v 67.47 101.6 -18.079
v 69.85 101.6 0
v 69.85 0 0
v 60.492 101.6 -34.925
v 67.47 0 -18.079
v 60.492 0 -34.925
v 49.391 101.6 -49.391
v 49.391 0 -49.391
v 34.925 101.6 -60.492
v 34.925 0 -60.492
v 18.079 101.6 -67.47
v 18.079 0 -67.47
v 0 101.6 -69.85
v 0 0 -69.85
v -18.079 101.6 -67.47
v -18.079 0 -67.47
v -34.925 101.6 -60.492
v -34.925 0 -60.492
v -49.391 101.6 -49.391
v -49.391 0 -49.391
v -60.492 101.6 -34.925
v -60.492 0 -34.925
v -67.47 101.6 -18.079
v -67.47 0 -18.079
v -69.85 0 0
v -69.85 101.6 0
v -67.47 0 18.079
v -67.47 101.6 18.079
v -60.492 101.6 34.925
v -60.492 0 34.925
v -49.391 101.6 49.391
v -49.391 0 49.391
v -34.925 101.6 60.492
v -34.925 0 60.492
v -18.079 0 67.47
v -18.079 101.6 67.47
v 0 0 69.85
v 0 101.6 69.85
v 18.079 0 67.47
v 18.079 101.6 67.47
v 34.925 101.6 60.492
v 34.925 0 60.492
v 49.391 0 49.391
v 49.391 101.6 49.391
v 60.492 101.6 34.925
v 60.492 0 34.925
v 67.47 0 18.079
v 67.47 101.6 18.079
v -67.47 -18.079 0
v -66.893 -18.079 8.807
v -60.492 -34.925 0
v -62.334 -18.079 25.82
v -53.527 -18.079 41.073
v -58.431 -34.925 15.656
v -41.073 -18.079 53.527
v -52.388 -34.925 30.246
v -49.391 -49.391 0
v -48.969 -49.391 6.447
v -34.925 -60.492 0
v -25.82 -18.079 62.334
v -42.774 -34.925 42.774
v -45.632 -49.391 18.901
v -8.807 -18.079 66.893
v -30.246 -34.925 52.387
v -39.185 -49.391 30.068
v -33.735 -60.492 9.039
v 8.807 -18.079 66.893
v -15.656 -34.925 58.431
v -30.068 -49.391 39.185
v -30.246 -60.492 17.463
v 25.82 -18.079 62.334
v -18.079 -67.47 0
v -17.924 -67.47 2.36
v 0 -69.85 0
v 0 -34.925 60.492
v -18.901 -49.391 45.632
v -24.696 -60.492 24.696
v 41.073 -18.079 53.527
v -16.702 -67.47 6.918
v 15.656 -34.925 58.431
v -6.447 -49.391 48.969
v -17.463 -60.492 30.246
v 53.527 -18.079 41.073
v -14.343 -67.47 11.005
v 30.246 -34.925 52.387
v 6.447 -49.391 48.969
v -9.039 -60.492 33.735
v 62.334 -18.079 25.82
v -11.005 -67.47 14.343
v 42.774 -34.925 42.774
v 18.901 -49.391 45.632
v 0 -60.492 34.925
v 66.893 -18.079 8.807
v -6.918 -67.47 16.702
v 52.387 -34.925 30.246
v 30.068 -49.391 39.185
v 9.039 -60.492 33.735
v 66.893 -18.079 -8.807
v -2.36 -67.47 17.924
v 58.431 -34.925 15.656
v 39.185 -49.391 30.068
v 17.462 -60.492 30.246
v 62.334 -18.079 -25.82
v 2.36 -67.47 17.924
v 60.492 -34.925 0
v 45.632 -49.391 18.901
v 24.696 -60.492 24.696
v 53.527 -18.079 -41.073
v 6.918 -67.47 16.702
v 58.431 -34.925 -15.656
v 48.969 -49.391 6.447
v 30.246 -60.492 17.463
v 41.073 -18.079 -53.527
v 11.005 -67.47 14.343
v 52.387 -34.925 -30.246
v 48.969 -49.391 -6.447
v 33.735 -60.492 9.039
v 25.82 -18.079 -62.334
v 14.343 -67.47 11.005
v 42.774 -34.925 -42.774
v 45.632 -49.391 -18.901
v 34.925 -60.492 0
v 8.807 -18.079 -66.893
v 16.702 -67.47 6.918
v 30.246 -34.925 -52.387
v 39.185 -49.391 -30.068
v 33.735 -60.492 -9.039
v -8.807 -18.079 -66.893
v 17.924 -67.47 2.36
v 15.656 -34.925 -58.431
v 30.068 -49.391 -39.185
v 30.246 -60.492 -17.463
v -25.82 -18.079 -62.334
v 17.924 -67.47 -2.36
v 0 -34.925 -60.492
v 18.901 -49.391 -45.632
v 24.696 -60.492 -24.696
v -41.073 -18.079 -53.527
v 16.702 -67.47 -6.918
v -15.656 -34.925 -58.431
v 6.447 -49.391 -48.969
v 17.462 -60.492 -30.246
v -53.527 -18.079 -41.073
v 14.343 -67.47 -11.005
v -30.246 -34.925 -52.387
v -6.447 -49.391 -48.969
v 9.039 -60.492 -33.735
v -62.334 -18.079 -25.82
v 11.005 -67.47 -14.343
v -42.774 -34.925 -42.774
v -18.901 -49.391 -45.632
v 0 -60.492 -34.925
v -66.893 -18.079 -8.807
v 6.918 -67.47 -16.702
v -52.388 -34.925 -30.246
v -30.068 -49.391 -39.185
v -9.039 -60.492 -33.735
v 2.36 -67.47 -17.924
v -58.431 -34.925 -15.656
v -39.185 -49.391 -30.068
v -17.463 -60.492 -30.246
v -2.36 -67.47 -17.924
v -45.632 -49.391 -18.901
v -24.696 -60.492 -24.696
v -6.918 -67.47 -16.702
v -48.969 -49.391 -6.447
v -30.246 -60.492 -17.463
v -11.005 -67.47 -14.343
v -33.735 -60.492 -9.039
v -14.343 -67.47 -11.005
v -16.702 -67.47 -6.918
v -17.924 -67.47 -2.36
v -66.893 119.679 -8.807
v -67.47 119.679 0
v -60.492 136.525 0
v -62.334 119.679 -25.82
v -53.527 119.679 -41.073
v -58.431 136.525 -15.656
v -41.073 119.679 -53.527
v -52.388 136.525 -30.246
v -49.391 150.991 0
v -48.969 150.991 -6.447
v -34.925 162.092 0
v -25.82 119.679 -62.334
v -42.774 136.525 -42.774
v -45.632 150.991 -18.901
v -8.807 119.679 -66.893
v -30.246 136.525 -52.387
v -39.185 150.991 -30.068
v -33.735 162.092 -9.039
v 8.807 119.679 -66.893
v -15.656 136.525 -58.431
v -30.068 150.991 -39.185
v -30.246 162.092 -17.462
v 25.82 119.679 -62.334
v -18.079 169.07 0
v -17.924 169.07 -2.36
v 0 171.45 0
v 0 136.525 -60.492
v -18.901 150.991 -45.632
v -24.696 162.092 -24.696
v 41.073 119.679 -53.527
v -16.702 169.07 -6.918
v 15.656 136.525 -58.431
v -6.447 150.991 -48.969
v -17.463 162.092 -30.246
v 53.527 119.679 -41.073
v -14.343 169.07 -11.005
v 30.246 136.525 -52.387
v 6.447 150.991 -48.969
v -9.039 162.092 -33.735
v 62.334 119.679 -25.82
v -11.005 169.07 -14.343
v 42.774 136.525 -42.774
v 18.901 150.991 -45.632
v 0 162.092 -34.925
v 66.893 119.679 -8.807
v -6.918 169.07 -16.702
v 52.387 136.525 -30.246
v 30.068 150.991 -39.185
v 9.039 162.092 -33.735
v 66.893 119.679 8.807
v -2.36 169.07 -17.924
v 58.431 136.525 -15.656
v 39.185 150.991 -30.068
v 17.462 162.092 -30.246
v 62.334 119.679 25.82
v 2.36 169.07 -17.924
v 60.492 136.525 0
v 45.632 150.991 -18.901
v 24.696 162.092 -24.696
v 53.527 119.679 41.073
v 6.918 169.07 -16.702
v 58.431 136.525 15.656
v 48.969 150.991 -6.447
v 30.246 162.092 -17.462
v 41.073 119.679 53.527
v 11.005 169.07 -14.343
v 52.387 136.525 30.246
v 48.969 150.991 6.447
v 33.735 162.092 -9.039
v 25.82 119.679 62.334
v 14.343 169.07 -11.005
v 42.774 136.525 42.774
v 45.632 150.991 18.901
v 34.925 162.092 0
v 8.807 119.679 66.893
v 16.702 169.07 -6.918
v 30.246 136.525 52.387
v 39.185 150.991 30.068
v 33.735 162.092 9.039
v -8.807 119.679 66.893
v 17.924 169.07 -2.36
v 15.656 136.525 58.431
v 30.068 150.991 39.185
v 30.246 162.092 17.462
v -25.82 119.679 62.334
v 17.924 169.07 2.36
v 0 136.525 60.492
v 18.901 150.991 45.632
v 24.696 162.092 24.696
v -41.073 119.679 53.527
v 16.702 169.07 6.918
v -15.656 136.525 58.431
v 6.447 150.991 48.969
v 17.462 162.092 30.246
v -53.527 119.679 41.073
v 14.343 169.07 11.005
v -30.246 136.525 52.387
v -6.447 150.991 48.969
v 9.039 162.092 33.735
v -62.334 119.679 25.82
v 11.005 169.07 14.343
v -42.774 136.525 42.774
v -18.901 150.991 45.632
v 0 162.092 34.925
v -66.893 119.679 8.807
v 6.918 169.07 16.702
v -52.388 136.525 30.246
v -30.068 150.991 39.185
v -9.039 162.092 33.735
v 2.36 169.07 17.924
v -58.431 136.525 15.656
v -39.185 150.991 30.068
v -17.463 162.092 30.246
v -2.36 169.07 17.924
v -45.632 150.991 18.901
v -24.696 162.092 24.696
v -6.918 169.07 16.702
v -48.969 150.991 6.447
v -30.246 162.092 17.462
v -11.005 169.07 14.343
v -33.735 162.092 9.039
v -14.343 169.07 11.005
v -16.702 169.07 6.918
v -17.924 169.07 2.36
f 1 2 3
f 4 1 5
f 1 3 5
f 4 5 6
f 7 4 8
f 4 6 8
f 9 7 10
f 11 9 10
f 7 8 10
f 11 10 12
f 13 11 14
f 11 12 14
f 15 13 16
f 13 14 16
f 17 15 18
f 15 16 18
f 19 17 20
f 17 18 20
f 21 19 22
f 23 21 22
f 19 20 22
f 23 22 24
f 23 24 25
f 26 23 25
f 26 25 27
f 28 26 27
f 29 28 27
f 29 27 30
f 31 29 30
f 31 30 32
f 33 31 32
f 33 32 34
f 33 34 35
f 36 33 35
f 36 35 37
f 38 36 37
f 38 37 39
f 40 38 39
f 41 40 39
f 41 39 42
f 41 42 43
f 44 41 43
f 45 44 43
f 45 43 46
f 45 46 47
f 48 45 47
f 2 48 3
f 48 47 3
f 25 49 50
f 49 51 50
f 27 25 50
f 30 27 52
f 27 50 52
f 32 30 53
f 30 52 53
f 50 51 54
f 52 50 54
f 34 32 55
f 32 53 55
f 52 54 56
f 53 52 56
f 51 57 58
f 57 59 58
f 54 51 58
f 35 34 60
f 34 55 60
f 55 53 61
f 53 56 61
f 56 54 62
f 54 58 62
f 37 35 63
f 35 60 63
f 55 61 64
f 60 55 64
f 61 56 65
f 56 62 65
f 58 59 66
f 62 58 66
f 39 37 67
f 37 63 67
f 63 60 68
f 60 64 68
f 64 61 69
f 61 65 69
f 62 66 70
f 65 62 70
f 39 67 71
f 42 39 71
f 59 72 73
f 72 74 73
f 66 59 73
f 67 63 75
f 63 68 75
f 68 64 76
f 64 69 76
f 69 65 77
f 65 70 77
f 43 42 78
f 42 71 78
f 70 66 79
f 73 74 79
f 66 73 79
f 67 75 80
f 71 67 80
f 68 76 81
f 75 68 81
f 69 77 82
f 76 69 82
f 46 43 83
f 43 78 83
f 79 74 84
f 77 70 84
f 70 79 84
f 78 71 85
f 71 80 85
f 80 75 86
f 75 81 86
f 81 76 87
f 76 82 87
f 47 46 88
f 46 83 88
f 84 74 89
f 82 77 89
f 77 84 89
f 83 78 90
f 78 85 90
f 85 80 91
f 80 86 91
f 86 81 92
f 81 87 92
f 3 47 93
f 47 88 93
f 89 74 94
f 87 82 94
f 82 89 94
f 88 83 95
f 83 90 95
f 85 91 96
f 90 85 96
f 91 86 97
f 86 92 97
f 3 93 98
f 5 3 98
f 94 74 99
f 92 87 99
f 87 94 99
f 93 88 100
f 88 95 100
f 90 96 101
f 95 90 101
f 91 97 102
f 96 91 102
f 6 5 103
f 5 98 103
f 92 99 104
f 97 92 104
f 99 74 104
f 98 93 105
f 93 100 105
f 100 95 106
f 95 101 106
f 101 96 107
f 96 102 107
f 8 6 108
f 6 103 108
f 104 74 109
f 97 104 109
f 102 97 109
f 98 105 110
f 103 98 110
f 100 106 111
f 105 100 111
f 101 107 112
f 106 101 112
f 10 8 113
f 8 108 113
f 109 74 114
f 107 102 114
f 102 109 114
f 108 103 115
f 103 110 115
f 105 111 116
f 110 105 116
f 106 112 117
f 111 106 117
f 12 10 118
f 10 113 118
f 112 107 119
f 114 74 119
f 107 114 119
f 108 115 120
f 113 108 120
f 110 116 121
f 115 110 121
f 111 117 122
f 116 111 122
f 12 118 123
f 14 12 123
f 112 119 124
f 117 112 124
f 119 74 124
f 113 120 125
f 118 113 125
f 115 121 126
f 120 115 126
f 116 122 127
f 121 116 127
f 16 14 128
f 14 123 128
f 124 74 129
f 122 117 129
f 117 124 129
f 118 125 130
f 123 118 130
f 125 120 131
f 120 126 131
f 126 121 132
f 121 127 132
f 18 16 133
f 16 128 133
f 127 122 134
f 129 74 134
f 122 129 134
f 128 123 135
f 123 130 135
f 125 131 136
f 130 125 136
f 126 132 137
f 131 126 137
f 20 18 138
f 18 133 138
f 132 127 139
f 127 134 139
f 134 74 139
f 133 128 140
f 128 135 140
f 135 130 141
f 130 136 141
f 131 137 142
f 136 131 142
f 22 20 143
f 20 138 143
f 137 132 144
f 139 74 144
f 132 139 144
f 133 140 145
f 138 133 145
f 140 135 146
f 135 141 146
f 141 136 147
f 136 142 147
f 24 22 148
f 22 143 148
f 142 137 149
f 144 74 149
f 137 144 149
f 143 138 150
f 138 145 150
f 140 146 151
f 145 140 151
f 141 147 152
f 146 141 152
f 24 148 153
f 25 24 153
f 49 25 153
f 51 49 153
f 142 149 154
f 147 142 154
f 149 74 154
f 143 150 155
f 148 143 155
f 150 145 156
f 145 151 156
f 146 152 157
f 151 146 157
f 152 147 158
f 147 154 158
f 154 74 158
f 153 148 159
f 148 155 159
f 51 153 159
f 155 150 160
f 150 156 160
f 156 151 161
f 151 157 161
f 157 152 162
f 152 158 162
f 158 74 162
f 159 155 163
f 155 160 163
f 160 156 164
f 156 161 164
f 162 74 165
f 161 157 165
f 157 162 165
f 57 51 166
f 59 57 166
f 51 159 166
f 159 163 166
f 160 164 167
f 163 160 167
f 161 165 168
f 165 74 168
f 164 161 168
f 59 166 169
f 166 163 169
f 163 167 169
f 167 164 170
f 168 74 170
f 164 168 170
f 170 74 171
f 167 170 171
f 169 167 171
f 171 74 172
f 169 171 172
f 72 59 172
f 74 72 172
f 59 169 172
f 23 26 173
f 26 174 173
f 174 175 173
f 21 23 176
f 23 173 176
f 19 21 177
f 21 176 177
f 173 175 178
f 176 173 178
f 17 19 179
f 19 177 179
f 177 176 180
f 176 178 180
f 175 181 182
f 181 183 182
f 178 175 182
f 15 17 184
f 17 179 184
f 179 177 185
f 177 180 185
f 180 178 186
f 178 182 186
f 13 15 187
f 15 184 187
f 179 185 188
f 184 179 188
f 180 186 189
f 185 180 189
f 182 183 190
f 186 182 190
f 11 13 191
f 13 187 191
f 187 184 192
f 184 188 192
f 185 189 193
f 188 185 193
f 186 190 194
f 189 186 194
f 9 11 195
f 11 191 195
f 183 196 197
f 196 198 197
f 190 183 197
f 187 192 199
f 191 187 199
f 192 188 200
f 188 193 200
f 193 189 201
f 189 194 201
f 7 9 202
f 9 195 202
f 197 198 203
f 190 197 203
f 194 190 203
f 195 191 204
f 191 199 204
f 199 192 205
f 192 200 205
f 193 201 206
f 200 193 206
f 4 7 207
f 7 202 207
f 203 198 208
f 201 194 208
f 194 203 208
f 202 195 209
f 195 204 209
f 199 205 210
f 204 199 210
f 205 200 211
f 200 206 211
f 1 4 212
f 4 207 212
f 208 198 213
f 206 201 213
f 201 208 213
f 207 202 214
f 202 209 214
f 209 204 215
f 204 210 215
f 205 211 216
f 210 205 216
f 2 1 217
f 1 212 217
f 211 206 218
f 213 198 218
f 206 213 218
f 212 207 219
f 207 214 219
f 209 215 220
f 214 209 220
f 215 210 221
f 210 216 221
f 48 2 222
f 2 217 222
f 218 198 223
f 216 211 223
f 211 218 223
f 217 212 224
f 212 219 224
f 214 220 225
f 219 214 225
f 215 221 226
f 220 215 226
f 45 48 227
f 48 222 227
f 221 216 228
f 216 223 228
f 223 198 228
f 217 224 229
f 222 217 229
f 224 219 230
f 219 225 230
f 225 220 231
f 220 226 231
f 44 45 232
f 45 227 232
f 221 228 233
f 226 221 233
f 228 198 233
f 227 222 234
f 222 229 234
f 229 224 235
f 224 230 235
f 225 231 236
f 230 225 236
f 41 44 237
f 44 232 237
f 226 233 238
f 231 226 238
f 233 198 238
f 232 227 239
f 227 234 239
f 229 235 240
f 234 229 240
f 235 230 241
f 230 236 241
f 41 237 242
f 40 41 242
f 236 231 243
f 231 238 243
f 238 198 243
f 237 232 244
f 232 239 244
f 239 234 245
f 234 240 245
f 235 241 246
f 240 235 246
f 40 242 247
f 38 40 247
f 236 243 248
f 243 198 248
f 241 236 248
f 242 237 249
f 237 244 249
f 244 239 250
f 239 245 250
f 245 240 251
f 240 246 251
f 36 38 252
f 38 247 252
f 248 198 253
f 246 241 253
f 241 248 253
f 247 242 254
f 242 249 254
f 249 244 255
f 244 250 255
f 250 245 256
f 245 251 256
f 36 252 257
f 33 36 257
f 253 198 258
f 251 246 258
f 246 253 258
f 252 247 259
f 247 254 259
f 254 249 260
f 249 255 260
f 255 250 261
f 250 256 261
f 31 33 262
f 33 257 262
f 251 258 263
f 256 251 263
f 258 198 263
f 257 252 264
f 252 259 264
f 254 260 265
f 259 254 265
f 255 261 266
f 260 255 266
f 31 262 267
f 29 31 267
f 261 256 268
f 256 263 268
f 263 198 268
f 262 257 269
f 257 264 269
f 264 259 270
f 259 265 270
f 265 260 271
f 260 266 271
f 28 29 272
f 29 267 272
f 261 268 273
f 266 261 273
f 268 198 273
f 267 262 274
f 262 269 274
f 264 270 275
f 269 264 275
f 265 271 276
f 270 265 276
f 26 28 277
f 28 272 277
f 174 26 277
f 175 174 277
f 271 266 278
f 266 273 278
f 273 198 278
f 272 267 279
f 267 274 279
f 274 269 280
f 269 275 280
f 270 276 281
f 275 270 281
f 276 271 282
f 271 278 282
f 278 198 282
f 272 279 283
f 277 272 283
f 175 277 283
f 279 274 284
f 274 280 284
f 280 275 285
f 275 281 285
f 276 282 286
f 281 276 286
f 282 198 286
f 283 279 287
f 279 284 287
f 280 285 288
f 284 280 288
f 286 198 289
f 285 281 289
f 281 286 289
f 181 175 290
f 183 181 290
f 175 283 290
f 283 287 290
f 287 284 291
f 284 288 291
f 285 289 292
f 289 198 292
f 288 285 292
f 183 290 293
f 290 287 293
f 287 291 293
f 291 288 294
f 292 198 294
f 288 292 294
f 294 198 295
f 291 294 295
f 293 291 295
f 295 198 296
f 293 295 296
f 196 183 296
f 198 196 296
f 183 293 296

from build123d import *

# Parameters (mm, degrees)
SKETCH2_R      = 69.85
EXTRUDE1_DEPTH = 101.6


with BuildPart() as part:
    # Sketch2 → Extrude1 (new body)
    with BuildSketch(Plane(origin=(0, 0, 0), x_dir=(1, 0, 0), z_dir=(0, 1, 0))):
        Circle(SKETCH2_R)
    extrude(amount=EXTRUDE1_DEPTH)

    # Sketch5 → Revolve1 (revolve)
    with BuildSketch(Plane.XY):
        with BuildLine():
            Line((0, 171.45), (0, 101.6))
            Line((0, 101.6), (-69.85, 101.6))
            ThreePointArc((-69.85, 101.6), (-49.391408666, 150.991408666), (0, 171.45))
        make_face()
    revolve(axis=Axis((0, 101.6, 0), (0, -1, 0)))

    # Sketch6 → Revolve2 (revolve)
    with BuildSketch(Plane.XY):
        with BuildLine():
            Line((0, -69.85), (0, 0))
            Line((0, 0), (-69.85, 0))
            ThreePointArc((-69.85, 0), (-49.391408666, -49.391408666), (0, -69.85))
        make_face()
    revolve(axis=Axis((0, 0, 0), (0, 1, 0)))


solid = part.part
